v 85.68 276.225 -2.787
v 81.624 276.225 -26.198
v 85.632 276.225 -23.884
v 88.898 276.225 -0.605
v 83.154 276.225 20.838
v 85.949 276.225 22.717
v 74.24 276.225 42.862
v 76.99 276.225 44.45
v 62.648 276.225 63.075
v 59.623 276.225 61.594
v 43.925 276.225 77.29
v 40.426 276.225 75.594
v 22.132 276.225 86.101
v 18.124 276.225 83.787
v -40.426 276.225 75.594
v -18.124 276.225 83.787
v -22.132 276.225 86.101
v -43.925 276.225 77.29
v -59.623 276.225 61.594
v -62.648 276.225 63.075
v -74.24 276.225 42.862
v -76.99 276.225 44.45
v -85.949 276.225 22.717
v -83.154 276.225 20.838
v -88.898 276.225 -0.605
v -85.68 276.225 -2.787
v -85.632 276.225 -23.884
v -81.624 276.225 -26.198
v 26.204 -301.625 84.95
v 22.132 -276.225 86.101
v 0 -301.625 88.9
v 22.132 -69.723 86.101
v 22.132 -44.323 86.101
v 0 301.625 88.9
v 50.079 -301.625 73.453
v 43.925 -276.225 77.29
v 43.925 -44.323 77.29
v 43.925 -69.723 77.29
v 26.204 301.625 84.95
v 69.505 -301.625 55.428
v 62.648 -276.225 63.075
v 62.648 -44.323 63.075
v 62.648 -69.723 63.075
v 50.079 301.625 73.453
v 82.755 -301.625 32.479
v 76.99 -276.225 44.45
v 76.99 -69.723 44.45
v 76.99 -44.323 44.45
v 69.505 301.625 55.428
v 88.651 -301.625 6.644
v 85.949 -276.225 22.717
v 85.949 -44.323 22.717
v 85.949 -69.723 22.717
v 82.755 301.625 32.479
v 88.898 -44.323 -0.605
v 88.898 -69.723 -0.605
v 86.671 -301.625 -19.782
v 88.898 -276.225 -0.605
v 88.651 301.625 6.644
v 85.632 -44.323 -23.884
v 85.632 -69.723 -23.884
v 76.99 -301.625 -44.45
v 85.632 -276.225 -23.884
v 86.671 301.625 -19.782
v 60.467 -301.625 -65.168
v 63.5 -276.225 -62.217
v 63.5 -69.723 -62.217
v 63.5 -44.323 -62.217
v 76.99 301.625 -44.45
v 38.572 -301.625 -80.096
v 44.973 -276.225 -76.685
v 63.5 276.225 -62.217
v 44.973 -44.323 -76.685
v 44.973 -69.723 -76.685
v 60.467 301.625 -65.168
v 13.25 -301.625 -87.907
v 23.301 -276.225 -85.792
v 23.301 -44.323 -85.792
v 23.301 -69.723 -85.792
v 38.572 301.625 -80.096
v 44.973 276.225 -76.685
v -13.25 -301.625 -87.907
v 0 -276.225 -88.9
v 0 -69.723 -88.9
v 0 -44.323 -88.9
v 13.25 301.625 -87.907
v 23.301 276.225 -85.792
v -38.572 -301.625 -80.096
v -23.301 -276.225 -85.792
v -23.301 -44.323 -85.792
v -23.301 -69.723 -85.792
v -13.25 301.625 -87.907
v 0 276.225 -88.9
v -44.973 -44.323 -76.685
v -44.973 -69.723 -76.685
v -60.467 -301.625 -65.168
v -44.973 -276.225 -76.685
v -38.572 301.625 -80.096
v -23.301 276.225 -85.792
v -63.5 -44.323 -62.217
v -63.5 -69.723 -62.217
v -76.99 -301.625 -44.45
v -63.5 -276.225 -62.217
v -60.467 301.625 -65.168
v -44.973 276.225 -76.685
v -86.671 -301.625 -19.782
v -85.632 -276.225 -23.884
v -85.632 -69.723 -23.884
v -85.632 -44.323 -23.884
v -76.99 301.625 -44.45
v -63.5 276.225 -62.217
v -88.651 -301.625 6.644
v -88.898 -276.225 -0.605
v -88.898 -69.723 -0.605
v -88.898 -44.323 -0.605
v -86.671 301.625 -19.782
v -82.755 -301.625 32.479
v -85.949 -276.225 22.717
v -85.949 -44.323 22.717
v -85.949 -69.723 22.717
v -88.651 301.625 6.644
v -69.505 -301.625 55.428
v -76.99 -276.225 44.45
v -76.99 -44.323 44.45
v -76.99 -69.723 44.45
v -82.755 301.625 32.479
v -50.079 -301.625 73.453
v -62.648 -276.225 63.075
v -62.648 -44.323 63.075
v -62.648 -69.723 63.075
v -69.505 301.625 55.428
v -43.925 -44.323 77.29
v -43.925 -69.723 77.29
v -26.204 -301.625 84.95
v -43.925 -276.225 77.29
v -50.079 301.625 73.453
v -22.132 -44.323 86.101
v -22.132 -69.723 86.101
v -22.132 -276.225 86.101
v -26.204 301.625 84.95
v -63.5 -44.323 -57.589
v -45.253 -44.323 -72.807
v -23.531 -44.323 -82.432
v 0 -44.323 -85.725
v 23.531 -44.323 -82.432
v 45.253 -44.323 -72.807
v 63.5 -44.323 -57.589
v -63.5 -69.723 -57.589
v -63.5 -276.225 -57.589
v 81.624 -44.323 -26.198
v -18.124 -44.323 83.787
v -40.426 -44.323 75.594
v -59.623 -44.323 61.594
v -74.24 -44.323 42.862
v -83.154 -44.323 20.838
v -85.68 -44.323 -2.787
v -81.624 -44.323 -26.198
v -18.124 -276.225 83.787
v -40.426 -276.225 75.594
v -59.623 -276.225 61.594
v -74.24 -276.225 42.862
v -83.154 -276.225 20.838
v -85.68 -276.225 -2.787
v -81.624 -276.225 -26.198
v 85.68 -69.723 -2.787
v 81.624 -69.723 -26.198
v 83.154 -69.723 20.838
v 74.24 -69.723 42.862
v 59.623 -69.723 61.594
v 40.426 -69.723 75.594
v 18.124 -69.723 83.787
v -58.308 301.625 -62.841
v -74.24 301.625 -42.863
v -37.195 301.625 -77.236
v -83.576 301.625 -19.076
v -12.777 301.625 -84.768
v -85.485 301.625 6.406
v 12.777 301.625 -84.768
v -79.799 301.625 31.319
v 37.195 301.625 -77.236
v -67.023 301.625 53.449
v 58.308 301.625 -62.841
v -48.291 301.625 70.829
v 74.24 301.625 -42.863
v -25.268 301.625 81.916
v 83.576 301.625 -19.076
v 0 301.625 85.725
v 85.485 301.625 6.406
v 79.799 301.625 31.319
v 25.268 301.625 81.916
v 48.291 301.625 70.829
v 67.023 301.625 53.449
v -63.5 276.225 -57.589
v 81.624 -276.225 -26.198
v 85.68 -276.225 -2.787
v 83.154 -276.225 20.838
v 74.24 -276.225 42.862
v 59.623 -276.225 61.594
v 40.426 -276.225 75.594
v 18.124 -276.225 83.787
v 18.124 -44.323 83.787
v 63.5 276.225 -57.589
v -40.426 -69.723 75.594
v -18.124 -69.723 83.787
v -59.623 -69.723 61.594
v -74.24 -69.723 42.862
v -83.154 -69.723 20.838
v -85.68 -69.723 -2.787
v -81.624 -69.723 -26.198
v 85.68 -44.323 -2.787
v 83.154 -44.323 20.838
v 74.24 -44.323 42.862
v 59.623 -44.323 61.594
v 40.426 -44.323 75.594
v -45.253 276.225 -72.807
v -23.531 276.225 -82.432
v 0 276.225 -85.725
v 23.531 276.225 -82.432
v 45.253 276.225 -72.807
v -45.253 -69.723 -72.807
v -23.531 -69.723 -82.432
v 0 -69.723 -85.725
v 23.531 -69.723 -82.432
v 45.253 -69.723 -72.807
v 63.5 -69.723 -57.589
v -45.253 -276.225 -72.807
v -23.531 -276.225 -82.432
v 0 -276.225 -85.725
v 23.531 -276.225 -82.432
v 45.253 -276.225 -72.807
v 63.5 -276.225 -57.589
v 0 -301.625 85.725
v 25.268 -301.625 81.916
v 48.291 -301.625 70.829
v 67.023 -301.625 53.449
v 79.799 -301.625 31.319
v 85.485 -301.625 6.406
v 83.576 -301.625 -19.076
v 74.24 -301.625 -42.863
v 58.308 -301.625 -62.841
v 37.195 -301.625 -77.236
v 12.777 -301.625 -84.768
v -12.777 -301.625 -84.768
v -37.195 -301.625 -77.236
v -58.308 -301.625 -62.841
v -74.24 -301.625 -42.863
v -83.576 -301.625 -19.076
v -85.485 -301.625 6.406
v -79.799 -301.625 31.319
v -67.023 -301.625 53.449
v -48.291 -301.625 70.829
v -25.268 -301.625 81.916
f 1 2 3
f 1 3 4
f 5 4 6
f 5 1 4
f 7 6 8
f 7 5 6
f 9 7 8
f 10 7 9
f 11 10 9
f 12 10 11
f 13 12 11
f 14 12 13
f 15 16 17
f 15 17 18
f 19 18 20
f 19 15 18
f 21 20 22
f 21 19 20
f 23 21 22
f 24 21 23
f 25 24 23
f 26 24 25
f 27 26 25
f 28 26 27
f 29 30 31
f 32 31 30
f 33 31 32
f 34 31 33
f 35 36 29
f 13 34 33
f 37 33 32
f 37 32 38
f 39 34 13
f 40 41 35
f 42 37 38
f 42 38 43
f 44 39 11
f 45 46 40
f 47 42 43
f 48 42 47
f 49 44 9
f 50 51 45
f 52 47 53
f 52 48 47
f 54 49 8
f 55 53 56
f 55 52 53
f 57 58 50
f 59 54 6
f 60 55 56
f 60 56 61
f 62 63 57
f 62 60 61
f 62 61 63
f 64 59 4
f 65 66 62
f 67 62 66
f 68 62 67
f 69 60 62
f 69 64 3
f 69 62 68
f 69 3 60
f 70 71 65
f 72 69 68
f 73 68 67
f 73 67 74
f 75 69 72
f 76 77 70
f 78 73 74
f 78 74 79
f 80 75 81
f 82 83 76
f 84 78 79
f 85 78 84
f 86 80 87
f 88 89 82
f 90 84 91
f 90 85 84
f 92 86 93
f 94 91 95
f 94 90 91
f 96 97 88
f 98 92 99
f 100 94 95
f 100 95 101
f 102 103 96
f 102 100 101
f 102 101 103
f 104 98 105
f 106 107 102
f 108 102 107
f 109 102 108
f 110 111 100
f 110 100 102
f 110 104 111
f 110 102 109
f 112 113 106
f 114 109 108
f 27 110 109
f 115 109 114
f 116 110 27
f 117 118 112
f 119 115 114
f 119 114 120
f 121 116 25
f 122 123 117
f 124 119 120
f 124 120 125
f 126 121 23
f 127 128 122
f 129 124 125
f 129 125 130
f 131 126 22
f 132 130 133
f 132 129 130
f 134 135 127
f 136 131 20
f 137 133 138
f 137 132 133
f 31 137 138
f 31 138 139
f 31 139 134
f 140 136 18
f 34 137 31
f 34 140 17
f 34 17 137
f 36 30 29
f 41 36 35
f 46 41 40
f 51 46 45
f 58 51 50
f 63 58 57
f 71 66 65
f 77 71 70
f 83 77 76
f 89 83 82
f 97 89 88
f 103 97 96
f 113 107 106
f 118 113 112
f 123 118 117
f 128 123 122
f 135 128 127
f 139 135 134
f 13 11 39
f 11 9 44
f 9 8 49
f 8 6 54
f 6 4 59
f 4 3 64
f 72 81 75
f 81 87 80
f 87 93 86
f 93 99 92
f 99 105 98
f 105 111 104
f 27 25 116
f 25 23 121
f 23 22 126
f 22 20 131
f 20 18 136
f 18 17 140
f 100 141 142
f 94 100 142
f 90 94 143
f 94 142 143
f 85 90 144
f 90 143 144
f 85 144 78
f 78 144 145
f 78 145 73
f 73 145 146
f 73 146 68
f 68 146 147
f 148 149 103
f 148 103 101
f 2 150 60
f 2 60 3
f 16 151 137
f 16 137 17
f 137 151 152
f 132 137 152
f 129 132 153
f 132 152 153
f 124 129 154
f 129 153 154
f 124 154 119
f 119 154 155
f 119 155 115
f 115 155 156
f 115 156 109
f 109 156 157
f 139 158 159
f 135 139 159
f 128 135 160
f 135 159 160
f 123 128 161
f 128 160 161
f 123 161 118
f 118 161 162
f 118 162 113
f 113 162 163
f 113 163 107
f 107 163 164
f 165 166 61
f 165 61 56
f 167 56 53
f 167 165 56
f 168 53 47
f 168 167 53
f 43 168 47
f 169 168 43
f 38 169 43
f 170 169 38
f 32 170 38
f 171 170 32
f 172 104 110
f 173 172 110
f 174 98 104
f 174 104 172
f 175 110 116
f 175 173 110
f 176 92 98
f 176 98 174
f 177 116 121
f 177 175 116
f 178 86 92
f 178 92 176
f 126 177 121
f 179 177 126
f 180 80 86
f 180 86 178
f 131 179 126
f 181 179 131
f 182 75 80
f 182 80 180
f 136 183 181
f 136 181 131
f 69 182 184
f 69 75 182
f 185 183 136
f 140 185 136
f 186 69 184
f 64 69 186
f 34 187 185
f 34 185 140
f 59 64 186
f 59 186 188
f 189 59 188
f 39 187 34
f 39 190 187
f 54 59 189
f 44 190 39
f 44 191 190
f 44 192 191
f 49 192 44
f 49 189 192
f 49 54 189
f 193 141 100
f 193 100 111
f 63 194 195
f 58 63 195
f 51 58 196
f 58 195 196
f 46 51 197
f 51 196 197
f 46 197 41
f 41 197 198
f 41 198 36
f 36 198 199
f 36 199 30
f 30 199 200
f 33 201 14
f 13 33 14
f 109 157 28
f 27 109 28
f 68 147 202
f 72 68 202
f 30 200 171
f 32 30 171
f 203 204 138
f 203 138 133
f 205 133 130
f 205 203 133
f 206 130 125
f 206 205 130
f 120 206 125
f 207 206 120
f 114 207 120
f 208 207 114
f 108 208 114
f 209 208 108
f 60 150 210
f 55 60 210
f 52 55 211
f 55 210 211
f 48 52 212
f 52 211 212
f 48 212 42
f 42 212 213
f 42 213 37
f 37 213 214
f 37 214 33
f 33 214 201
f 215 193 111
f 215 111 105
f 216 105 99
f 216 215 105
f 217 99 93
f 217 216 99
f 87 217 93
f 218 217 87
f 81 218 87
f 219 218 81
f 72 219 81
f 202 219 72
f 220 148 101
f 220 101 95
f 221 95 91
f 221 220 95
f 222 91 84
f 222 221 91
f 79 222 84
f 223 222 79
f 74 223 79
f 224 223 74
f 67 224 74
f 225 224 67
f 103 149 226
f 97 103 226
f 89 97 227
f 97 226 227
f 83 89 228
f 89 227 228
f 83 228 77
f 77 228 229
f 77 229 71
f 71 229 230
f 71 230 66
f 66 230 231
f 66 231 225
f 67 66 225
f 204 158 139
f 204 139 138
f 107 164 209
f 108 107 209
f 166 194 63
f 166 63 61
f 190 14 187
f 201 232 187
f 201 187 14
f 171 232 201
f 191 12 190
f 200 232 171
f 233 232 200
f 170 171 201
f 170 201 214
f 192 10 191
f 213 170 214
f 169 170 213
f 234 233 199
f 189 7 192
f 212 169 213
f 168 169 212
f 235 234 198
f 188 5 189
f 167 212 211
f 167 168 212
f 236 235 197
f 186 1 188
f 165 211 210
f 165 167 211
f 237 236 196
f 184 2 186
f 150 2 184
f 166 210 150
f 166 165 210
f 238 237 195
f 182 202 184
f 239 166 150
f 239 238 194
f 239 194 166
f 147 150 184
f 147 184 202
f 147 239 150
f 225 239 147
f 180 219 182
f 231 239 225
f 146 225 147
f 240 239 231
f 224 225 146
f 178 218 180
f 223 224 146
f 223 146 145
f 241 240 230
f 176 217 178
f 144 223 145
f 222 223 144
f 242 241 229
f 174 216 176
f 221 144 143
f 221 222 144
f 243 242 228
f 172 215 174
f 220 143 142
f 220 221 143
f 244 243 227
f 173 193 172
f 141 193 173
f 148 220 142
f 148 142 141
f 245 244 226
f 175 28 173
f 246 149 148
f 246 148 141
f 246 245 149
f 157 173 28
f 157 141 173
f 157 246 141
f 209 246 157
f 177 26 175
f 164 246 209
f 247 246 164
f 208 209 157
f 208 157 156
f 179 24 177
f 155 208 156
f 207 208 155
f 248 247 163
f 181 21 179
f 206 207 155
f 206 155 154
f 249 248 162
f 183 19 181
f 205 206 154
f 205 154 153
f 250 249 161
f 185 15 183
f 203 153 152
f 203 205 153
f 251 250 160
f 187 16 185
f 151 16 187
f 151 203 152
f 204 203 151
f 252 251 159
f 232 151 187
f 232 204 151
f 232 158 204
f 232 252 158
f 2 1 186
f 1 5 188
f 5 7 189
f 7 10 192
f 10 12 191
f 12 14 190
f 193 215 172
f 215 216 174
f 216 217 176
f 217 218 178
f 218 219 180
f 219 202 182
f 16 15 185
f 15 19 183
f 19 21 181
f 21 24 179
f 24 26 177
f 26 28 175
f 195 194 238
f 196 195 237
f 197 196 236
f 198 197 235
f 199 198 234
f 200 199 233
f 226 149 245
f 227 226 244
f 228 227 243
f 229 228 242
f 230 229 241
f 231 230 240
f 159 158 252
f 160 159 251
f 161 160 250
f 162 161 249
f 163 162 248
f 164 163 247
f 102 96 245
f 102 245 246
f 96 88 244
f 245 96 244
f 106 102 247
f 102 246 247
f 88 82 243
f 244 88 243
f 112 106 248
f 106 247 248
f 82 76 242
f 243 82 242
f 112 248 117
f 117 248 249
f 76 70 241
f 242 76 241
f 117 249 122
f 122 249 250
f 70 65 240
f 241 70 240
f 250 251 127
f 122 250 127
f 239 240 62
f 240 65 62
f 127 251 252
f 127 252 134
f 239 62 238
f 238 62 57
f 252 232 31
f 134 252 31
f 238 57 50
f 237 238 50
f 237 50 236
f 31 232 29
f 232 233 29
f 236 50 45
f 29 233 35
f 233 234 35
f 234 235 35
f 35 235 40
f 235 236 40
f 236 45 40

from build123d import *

# Parameters (mm, degrees)
SKETCH1_R               = 88.9
SKETCH1_R_2             = 85.725
BOSS_EXTRUDE1_DEPTH     = 301.625
CUT_EXTRUDE1_REACH      = 328.778
CUT_EXTRUDE1_END_RADIUS = 88.9
SKETCH2_W               = 127
SKETCH2_H               = 206.502
SKETCH2_H_2             = 320.548
CIRPATTERN1_COUNT       = 3


with BuildPart() as part:
    # Sketch1 → Boss-Extrude1 (new, symmetric)
    with BuildSketch(Plane(origin=(0, 0, 0), x_dir=(1, 0, 0), z_dir=(0, 1, 0))):
        with Locations(Location((0, 0, 0), (0, 0, 270))):
            Circle(SKETCH1_R)
        with Locations(Location((0, 0, 0), (0, 0, 270))):
            Circle(SKETCH1_R_2, mode=Mode.SUBTRACT)
    extrude(amount=BOSS_EXTRUDE1_DEPTH, both=True)

    # Cut-Extrude1: up to this cylinder (the profile starts inside it)
    cut_extrude1_end = Plane(origin=(0, -28.5115, 0), z_dir=(0, -1, 0)) * Cylinder(CUT_EXTRUDE1_END_RADIUS, 1125.281, mode=Mode.PRIVATE)
    # Sketch2 → Cut-Extrude1 (cut, up to the surface)
    with BuildSketch(Plane.XY, mode=Mode.PRIVATE) as cut_extrude1_sk1:
        with Locations((0, -172.974)):
            Rectangle(SKETCH2_W, SKETCH2_H)
    cut_extrude1_tool1 = extrude(cut_extrude1_sk1.sketch, amount=-CUT_EXTRUDE1_REACH, mode=Mode.PRIVATE) & cut_extrude1_end
    # Sketch2 → Cut-Extrude1 (cut, up to the surface)
    with BuildSketch(Plane.XY, mode=Mode.PRIVATE) as cut_extrude1_sk2:
        with Locations((0, 115.951)):
            Rectangle(SKETCH2_W, SKETCH2_H_2)
    cut_extrude1_tool2 = extrude(cut_extrude1_sk2.sketch, amount=-CUT_EXTRUDE1_REACH, mode=Mode.PRIVATE) & cut_extrude1_end
    cut_extrude1 = cut_extrude1_tool1.solids().sort_by_distance((0, -172.974, 0))[0] + cut_extrude1_tool2.solids().sort_by_distance((0, 115.951, 0))[0]
    add(cut_extrude1, mode=Mode.SUBTRACT)

    # CirPattern1: Cut-Extrude1 ×3 about axis
    cirpattern1_axis = Axis((0, 0, 0), (0, 1, 0))
    for i in range(1, CIRPATTERN1_COUNT):
        add(cut_extrude1.rotate(cirpattern1_axis, i * 360 / CIRPATTERN1_COUNT), mode=Mode.SUBTRACT)


solid = part.part
